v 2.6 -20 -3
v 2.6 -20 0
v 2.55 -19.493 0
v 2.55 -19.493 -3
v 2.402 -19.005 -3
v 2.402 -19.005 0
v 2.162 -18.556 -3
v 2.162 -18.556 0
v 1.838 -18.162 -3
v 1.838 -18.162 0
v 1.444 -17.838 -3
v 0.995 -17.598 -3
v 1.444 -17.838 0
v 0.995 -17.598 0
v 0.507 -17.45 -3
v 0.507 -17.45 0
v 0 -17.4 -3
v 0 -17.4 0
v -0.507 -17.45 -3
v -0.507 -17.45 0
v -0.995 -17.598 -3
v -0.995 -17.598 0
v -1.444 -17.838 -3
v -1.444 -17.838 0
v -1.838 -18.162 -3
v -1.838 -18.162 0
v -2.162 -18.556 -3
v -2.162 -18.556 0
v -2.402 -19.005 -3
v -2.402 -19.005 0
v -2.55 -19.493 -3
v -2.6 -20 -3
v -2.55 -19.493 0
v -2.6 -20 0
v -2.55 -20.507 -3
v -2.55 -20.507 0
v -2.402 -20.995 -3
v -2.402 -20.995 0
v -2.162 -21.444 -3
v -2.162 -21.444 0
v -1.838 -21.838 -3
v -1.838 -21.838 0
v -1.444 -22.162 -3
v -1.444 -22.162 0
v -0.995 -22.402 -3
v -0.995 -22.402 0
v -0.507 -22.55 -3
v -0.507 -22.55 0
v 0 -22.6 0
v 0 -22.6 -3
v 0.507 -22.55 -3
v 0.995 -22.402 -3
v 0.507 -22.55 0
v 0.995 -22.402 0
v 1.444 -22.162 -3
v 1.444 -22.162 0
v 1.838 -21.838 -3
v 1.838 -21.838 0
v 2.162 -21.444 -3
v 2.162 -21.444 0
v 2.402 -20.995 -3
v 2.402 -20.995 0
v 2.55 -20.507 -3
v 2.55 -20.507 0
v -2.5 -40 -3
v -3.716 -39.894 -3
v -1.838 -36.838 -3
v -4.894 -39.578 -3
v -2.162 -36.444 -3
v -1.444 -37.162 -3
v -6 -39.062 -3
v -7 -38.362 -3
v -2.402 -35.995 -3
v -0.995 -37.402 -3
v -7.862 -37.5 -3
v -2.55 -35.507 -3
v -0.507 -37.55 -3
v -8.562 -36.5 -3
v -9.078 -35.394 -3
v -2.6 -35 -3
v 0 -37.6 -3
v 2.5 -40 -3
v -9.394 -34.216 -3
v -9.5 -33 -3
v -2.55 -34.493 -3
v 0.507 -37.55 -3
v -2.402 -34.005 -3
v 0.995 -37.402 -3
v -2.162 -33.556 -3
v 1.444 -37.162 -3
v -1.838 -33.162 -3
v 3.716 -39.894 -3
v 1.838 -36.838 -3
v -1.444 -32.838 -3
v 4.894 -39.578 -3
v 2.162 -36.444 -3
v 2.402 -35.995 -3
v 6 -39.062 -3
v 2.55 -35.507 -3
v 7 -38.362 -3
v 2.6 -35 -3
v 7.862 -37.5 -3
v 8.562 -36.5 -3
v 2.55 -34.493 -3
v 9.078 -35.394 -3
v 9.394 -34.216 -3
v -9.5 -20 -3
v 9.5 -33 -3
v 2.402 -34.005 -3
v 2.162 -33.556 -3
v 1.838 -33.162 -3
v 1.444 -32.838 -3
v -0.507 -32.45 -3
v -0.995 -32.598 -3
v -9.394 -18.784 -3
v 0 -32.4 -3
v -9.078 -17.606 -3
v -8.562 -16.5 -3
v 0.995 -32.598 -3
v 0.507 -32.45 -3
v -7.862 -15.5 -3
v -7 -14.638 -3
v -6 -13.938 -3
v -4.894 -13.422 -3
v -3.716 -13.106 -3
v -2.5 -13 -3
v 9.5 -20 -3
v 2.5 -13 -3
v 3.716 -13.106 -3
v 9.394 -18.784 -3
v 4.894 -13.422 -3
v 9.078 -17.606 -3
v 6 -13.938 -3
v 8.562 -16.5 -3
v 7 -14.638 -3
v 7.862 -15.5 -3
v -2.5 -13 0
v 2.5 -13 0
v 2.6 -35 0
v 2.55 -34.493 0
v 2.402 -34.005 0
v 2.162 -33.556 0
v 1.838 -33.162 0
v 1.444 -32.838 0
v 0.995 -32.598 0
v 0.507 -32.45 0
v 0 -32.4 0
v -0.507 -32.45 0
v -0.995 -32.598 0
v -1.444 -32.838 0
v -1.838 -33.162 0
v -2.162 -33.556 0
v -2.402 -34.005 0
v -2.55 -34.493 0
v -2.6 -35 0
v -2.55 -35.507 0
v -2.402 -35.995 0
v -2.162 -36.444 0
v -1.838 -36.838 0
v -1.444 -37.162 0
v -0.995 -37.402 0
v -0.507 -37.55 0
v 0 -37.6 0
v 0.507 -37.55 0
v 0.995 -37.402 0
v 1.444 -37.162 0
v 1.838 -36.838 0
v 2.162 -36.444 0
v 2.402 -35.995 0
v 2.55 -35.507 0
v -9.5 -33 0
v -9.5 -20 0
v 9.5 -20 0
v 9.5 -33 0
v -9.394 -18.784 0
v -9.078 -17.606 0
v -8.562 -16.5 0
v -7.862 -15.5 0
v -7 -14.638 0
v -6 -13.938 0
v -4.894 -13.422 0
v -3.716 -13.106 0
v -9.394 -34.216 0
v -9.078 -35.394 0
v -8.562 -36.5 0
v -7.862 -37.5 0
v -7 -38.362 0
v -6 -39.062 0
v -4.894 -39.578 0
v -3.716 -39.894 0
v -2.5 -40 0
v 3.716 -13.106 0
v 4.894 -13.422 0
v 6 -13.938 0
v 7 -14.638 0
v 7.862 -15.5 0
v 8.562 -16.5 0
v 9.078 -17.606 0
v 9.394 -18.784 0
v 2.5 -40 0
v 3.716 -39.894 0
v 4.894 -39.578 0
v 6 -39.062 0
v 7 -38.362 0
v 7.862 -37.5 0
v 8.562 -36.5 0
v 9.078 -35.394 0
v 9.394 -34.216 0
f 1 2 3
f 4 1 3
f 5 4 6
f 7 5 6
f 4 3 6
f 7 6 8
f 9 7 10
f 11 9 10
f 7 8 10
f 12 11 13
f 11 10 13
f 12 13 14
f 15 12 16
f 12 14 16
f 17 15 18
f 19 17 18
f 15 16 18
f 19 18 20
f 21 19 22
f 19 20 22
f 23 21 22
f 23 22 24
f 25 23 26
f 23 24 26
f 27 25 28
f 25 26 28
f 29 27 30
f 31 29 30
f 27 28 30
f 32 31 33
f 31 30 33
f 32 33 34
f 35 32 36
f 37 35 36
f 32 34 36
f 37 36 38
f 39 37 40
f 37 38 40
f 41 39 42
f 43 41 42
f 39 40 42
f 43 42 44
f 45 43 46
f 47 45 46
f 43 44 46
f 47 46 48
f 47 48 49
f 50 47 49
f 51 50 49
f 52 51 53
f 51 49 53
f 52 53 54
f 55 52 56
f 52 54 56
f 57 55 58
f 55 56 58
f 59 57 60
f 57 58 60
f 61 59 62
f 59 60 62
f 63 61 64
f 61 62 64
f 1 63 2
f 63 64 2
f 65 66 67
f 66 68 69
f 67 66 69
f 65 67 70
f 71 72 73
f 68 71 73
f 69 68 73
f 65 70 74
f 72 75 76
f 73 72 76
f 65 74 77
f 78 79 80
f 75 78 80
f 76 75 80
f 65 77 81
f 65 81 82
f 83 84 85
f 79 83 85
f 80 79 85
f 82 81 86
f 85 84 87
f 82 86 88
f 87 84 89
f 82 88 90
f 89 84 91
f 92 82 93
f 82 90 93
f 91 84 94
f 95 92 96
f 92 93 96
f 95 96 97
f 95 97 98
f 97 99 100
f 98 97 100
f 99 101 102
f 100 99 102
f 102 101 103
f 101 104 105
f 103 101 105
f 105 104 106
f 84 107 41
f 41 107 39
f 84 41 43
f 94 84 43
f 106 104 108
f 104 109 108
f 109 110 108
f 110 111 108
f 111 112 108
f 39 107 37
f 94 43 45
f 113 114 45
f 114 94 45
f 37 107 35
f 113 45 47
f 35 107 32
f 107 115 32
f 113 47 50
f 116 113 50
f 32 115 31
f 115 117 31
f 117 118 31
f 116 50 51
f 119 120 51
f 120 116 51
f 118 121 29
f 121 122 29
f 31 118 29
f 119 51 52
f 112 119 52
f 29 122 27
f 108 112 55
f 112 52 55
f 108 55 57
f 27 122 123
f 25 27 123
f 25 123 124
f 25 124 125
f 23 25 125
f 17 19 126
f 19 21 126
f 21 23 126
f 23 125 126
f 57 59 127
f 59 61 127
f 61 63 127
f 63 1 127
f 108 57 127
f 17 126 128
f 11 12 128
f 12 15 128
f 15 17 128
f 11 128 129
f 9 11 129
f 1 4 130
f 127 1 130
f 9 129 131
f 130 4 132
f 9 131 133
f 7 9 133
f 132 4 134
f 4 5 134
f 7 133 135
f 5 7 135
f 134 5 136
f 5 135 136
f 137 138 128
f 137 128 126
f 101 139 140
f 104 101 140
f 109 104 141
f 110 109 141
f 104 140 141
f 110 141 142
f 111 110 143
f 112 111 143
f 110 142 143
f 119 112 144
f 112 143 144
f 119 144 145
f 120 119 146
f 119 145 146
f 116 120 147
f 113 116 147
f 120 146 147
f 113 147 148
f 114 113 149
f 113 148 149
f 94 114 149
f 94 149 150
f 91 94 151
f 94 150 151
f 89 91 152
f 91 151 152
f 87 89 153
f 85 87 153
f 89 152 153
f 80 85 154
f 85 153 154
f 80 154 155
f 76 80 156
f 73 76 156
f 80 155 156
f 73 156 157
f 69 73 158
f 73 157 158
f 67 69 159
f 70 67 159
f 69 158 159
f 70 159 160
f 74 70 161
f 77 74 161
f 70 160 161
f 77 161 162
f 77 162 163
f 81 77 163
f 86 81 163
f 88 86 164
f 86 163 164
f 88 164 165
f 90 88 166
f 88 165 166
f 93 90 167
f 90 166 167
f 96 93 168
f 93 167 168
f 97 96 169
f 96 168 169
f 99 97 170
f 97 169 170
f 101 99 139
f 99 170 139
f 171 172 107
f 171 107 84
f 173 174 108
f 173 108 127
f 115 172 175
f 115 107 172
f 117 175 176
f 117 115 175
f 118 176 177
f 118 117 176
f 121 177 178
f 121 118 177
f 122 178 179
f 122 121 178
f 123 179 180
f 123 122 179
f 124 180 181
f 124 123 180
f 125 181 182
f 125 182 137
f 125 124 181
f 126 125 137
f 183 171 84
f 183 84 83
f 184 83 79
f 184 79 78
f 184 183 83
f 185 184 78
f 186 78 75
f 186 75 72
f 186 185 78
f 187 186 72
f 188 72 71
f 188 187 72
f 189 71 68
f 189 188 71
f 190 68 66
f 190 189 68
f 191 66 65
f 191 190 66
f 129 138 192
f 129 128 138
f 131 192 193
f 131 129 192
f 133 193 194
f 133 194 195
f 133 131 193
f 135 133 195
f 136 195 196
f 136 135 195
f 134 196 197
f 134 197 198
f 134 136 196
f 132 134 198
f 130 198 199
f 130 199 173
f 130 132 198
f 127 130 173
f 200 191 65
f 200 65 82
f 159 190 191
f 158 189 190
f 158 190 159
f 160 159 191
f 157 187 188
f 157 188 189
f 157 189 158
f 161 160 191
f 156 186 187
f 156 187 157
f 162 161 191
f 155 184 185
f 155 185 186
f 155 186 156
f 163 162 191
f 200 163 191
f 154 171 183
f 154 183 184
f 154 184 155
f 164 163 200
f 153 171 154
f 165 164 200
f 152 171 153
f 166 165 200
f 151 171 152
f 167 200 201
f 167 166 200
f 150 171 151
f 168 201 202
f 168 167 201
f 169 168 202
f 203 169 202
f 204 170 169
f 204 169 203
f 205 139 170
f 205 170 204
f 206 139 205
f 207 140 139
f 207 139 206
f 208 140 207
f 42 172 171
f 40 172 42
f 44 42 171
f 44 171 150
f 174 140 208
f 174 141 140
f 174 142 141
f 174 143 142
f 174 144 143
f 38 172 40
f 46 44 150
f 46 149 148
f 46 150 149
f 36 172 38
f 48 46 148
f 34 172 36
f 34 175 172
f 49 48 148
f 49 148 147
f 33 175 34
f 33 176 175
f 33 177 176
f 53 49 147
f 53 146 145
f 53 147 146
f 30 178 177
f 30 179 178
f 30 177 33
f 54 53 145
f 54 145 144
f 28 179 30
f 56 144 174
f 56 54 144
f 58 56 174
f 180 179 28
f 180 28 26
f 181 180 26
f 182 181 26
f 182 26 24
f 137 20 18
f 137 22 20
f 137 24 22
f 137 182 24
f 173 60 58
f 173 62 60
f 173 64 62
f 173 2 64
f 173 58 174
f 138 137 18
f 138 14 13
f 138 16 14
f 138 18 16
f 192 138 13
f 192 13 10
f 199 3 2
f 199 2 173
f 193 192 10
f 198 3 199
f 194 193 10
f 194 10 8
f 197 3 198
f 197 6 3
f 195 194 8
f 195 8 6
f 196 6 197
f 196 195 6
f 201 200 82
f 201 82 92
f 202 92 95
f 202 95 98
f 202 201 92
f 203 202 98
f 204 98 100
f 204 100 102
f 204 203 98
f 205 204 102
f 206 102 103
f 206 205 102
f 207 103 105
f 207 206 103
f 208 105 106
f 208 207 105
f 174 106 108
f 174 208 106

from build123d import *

# Parameters (mm, degrees)
SKETCH1_R          = 2.6
BASE_FLANGE1_DEPTH = 3
FILLET1_R          = 7


# Sheet-metal steps are written as plain solids
with BuildPart() as part:
    # Sketch1 → Base-Flange1 (new body)
    with BuildSketch(Plane.XY):
        with BuildLine():
            Line((-9.5, -13), (-9.5, -33))
            ThreePointArc((-9.5, -33), (-7.449747468, -37.949747468), (-2.5, -40))
            Line((-2.5, -40), (2.5, -40))
            ThreePointArc((2.5, -40), (7.449747468, -37.949747468), (9.5, -33))
            Line((9.5, -33), (9.5, -13))
            Line((9.5, -13), (-9.5, -13))
        make_face()
        with Locations((0, -35)):
            Circle(SKETCH1_R, mode=Mode.SUBTRACT)
        with Locations((0, -20)):
            Circle(SKETCH1_R, mode=Mode.SUBTRACT)
    extrude(amount=-BASE_FLANGE1_DEPTH)

    # Fillet1
    fillet1_edges = [part.edges().sort_by_distance(p)[0] for p in [
        (9.5, -13, -1.5),
        (-9.5, -13, -1.5),
    ]]
    fillet(fillet1_edges, radius=FILLET1_R)


solid = part.part
